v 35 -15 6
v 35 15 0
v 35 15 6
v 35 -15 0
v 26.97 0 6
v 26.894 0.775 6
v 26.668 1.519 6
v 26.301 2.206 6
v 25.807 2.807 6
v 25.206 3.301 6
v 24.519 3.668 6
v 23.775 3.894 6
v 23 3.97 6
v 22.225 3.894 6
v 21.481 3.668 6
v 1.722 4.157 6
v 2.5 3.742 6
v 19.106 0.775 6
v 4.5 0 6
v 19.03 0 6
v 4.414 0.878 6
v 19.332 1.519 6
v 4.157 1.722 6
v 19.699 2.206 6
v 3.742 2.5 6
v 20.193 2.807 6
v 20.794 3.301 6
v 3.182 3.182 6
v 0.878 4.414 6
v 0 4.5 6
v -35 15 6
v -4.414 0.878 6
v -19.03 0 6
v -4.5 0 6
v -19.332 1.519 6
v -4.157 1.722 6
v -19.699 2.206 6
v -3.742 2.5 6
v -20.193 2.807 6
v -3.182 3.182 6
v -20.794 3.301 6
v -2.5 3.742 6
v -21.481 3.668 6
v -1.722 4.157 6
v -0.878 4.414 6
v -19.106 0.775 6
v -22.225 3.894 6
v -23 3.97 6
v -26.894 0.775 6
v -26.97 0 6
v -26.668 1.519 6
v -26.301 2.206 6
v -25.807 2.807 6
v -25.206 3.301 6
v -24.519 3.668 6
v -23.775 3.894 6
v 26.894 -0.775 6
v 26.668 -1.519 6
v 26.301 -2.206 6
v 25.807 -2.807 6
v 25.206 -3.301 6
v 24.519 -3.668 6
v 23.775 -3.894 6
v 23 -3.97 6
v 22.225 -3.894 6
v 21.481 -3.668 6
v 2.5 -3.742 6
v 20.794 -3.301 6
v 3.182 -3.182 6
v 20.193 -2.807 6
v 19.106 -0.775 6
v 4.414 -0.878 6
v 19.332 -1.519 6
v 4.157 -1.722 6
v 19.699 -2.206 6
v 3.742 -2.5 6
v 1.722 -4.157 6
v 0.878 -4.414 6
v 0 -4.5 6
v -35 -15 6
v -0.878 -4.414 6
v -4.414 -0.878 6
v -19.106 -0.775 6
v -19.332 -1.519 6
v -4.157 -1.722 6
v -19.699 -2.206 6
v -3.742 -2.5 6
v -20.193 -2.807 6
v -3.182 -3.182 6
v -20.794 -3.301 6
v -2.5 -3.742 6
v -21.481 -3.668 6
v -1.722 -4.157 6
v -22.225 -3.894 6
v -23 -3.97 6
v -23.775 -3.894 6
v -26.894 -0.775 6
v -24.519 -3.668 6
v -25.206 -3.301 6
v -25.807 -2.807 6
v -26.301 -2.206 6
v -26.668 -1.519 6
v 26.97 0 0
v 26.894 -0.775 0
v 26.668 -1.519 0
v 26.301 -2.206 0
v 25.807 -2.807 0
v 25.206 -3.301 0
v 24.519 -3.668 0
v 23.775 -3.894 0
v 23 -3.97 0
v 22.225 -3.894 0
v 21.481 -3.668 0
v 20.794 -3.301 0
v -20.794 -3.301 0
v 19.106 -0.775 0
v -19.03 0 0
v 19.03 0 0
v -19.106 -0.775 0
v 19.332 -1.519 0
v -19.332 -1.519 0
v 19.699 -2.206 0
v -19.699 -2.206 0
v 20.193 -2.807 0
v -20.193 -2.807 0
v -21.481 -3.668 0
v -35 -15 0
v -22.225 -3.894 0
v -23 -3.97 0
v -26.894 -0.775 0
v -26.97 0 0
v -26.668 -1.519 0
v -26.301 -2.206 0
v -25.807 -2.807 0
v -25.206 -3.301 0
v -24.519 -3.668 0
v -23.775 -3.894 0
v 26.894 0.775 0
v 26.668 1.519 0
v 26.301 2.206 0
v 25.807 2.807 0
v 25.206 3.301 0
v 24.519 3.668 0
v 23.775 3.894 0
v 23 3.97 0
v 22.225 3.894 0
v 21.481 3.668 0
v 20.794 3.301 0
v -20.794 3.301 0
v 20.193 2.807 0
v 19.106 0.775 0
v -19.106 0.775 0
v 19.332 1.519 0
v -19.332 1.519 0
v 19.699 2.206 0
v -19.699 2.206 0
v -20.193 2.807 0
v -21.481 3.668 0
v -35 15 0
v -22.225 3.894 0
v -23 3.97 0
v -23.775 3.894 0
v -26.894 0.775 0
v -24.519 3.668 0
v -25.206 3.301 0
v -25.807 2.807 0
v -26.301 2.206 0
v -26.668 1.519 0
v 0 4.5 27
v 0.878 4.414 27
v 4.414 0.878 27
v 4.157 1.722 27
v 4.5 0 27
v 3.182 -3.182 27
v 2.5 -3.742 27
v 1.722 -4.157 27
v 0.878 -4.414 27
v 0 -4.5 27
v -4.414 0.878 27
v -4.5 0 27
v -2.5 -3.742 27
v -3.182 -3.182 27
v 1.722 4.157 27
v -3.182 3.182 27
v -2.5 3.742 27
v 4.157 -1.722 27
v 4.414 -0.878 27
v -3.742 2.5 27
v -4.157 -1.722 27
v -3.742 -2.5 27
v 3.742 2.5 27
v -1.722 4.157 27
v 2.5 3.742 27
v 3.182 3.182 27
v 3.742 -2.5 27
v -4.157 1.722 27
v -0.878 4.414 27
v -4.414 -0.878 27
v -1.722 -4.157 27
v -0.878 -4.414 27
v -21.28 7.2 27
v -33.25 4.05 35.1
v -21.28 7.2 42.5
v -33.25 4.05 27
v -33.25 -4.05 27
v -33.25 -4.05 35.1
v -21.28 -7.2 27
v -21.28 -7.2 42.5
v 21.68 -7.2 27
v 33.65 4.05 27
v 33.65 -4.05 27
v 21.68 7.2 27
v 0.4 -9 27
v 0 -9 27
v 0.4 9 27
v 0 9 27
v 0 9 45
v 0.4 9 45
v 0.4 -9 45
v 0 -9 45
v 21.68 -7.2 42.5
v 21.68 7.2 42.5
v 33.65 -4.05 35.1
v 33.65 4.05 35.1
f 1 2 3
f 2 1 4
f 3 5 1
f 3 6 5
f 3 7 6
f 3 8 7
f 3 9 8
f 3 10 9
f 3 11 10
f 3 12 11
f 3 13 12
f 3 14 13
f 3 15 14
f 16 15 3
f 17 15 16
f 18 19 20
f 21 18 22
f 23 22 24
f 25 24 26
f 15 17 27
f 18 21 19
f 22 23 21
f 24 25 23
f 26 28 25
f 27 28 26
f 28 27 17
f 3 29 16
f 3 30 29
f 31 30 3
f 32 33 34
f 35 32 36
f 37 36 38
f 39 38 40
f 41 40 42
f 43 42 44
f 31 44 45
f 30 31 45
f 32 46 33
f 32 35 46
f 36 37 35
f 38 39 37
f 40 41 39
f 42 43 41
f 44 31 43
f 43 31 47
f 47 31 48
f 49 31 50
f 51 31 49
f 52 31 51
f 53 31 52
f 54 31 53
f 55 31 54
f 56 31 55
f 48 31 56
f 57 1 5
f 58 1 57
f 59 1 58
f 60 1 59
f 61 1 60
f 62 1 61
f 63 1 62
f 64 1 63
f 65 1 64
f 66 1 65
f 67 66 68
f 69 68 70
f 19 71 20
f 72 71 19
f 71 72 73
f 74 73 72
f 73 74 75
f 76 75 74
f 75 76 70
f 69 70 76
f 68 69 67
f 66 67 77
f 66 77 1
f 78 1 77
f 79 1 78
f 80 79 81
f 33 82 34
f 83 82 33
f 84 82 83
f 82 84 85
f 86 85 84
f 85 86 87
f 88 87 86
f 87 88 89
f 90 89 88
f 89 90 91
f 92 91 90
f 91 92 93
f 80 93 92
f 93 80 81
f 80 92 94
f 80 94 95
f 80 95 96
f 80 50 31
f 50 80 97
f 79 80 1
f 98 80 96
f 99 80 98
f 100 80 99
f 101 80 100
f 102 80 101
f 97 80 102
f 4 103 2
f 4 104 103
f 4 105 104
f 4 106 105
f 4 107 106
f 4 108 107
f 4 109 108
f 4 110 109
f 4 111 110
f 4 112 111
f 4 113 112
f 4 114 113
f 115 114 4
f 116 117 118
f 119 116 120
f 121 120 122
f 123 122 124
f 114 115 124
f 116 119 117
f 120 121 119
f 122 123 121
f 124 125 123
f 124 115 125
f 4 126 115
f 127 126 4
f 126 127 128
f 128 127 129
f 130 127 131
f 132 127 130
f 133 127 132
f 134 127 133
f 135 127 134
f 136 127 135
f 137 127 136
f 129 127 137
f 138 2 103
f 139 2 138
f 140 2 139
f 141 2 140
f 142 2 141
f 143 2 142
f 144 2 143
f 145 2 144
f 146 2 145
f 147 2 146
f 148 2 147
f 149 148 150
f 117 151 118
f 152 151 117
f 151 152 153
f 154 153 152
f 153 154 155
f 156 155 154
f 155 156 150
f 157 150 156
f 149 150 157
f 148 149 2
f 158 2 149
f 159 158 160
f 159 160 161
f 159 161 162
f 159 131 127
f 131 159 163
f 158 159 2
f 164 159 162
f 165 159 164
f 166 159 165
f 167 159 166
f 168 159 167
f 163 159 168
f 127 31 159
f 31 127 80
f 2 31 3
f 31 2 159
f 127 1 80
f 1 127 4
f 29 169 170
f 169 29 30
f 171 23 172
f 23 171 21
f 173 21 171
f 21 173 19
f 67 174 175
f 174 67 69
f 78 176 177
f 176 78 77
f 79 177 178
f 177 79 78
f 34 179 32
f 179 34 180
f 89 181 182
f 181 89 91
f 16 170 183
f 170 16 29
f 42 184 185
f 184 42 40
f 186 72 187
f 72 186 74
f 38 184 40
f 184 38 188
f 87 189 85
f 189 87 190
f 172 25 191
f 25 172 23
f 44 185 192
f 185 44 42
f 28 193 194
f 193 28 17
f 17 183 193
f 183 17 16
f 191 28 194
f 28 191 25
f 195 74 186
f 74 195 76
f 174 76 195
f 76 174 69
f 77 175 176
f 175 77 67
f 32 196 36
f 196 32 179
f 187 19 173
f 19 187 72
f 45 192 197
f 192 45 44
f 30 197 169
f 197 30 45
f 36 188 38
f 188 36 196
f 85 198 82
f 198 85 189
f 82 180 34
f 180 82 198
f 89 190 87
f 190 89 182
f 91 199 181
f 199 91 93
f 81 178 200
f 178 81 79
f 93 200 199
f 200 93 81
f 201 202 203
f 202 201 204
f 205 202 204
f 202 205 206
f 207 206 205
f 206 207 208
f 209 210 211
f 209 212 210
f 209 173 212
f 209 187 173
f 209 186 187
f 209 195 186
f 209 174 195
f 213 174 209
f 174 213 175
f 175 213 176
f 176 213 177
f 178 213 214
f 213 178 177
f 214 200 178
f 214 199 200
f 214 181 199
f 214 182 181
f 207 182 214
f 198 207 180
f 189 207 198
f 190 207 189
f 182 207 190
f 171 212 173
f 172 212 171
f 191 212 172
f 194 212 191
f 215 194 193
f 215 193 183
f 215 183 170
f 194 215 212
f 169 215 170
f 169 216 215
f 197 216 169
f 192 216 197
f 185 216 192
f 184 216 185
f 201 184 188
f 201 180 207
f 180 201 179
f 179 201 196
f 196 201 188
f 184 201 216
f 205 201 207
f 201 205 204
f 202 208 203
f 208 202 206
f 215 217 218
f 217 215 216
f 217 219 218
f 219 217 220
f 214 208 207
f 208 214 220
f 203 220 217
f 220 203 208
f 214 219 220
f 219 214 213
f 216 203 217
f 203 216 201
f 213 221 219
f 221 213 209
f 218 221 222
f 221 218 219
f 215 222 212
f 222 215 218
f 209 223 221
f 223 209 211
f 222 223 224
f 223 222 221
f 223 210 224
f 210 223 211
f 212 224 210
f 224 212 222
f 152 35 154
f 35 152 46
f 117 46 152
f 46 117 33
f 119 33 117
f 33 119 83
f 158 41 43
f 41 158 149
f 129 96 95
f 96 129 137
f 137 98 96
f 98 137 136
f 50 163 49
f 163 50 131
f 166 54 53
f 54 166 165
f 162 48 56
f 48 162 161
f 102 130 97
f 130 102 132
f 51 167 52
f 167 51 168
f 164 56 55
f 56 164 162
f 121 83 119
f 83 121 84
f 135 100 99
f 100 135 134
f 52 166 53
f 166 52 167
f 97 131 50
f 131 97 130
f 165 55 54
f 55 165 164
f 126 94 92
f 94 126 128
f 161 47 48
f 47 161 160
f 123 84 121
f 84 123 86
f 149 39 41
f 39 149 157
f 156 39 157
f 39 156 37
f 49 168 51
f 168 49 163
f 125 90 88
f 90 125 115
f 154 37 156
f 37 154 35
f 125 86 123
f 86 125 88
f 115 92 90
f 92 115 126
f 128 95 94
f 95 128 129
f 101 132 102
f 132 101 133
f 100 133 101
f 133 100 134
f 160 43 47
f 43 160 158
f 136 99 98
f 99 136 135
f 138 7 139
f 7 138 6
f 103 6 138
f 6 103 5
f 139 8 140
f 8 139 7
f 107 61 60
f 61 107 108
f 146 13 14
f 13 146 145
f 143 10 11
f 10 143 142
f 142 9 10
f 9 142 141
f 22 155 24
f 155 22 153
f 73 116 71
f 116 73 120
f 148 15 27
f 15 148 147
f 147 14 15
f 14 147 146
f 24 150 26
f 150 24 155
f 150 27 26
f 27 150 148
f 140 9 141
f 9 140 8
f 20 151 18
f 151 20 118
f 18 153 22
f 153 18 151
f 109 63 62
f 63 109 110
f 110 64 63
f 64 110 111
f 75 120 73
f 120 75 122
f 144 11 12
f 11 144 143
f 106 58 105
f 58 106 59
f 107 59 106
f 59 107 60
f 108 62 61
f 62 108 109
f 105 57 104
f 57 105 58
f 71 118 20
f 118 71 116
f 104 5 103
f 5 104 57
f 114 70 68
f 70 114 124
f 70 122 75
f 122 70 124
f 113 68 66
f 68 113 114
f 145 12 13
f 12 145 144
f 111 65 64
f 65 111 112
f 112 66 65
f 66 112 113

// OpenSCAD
$fn = 32;

// ----------------------------------------------------------------------
// Boat cleat: 70 mm base, horn 36 mm up
// ----------------------------------------------------------------------

// --- parameters (mm) ---
base_l = 70;              // base length
base_w = 30;              // base width
base_t = 6;               // base thickness
horn_len = 66.5;          // horn length
horn_d = 18;              // horn diameter at the middle
horn_z = 36;              // horn axis height
end_drop = 10;            // how far the horn tips drop
post_d = 9;               // centre post diameter
holes_d = 7.94;           // fixing holes
hole_x = 23;              // fixing hole spacing

difference() {
  union() {
    translate([-35, -15, 0]) cube([base_l, base_w, base_t]);
    /* centre post, sunk 1 mm into the base */
    translate([0, 0, 5]) cylinder(h = 31, d = post_d);
    /* horn: a hull chain of boxes, full in the middle and lighter at the tips */
    hull() {
      translate([-33.25, -4.05, 27]) cube([0.4, 8.1, 8.1], center = false);
      translate([-21.28, -7.2, 27]) cube([0.4, 14.4, 15.5], center = false);
    }
    hull() {
      translate([-21.28, -7.2, 27]) cube([0.4, 14.4, 15.5], center = false);
      translate([0, -9, 27]) cube([0.4, 18, 18], center = false);
    }
    hull() {
      translate([0, -9, 27]) cube([0.4, 18, 18], center = false);
      translate([21.28, -7.2, 27]) cube([0.4, 14.4, 15.5], center = false);
    }
    hull() {
      translate([21.28, -7.2, 27]) cube([0.4, 14.4, 15.5], center = false);
      translate([33.25, -4.05, 27]) cube([0.4, 8.1, 8.1], center = false);
    }
  }
  translate([-23, 0, -2.5]) cylinder(h = base_t + 5, d = holes_d);
  translate([23, 0, -2.5]) cylinder(h = base_t + 5, d = holes_d);
}
